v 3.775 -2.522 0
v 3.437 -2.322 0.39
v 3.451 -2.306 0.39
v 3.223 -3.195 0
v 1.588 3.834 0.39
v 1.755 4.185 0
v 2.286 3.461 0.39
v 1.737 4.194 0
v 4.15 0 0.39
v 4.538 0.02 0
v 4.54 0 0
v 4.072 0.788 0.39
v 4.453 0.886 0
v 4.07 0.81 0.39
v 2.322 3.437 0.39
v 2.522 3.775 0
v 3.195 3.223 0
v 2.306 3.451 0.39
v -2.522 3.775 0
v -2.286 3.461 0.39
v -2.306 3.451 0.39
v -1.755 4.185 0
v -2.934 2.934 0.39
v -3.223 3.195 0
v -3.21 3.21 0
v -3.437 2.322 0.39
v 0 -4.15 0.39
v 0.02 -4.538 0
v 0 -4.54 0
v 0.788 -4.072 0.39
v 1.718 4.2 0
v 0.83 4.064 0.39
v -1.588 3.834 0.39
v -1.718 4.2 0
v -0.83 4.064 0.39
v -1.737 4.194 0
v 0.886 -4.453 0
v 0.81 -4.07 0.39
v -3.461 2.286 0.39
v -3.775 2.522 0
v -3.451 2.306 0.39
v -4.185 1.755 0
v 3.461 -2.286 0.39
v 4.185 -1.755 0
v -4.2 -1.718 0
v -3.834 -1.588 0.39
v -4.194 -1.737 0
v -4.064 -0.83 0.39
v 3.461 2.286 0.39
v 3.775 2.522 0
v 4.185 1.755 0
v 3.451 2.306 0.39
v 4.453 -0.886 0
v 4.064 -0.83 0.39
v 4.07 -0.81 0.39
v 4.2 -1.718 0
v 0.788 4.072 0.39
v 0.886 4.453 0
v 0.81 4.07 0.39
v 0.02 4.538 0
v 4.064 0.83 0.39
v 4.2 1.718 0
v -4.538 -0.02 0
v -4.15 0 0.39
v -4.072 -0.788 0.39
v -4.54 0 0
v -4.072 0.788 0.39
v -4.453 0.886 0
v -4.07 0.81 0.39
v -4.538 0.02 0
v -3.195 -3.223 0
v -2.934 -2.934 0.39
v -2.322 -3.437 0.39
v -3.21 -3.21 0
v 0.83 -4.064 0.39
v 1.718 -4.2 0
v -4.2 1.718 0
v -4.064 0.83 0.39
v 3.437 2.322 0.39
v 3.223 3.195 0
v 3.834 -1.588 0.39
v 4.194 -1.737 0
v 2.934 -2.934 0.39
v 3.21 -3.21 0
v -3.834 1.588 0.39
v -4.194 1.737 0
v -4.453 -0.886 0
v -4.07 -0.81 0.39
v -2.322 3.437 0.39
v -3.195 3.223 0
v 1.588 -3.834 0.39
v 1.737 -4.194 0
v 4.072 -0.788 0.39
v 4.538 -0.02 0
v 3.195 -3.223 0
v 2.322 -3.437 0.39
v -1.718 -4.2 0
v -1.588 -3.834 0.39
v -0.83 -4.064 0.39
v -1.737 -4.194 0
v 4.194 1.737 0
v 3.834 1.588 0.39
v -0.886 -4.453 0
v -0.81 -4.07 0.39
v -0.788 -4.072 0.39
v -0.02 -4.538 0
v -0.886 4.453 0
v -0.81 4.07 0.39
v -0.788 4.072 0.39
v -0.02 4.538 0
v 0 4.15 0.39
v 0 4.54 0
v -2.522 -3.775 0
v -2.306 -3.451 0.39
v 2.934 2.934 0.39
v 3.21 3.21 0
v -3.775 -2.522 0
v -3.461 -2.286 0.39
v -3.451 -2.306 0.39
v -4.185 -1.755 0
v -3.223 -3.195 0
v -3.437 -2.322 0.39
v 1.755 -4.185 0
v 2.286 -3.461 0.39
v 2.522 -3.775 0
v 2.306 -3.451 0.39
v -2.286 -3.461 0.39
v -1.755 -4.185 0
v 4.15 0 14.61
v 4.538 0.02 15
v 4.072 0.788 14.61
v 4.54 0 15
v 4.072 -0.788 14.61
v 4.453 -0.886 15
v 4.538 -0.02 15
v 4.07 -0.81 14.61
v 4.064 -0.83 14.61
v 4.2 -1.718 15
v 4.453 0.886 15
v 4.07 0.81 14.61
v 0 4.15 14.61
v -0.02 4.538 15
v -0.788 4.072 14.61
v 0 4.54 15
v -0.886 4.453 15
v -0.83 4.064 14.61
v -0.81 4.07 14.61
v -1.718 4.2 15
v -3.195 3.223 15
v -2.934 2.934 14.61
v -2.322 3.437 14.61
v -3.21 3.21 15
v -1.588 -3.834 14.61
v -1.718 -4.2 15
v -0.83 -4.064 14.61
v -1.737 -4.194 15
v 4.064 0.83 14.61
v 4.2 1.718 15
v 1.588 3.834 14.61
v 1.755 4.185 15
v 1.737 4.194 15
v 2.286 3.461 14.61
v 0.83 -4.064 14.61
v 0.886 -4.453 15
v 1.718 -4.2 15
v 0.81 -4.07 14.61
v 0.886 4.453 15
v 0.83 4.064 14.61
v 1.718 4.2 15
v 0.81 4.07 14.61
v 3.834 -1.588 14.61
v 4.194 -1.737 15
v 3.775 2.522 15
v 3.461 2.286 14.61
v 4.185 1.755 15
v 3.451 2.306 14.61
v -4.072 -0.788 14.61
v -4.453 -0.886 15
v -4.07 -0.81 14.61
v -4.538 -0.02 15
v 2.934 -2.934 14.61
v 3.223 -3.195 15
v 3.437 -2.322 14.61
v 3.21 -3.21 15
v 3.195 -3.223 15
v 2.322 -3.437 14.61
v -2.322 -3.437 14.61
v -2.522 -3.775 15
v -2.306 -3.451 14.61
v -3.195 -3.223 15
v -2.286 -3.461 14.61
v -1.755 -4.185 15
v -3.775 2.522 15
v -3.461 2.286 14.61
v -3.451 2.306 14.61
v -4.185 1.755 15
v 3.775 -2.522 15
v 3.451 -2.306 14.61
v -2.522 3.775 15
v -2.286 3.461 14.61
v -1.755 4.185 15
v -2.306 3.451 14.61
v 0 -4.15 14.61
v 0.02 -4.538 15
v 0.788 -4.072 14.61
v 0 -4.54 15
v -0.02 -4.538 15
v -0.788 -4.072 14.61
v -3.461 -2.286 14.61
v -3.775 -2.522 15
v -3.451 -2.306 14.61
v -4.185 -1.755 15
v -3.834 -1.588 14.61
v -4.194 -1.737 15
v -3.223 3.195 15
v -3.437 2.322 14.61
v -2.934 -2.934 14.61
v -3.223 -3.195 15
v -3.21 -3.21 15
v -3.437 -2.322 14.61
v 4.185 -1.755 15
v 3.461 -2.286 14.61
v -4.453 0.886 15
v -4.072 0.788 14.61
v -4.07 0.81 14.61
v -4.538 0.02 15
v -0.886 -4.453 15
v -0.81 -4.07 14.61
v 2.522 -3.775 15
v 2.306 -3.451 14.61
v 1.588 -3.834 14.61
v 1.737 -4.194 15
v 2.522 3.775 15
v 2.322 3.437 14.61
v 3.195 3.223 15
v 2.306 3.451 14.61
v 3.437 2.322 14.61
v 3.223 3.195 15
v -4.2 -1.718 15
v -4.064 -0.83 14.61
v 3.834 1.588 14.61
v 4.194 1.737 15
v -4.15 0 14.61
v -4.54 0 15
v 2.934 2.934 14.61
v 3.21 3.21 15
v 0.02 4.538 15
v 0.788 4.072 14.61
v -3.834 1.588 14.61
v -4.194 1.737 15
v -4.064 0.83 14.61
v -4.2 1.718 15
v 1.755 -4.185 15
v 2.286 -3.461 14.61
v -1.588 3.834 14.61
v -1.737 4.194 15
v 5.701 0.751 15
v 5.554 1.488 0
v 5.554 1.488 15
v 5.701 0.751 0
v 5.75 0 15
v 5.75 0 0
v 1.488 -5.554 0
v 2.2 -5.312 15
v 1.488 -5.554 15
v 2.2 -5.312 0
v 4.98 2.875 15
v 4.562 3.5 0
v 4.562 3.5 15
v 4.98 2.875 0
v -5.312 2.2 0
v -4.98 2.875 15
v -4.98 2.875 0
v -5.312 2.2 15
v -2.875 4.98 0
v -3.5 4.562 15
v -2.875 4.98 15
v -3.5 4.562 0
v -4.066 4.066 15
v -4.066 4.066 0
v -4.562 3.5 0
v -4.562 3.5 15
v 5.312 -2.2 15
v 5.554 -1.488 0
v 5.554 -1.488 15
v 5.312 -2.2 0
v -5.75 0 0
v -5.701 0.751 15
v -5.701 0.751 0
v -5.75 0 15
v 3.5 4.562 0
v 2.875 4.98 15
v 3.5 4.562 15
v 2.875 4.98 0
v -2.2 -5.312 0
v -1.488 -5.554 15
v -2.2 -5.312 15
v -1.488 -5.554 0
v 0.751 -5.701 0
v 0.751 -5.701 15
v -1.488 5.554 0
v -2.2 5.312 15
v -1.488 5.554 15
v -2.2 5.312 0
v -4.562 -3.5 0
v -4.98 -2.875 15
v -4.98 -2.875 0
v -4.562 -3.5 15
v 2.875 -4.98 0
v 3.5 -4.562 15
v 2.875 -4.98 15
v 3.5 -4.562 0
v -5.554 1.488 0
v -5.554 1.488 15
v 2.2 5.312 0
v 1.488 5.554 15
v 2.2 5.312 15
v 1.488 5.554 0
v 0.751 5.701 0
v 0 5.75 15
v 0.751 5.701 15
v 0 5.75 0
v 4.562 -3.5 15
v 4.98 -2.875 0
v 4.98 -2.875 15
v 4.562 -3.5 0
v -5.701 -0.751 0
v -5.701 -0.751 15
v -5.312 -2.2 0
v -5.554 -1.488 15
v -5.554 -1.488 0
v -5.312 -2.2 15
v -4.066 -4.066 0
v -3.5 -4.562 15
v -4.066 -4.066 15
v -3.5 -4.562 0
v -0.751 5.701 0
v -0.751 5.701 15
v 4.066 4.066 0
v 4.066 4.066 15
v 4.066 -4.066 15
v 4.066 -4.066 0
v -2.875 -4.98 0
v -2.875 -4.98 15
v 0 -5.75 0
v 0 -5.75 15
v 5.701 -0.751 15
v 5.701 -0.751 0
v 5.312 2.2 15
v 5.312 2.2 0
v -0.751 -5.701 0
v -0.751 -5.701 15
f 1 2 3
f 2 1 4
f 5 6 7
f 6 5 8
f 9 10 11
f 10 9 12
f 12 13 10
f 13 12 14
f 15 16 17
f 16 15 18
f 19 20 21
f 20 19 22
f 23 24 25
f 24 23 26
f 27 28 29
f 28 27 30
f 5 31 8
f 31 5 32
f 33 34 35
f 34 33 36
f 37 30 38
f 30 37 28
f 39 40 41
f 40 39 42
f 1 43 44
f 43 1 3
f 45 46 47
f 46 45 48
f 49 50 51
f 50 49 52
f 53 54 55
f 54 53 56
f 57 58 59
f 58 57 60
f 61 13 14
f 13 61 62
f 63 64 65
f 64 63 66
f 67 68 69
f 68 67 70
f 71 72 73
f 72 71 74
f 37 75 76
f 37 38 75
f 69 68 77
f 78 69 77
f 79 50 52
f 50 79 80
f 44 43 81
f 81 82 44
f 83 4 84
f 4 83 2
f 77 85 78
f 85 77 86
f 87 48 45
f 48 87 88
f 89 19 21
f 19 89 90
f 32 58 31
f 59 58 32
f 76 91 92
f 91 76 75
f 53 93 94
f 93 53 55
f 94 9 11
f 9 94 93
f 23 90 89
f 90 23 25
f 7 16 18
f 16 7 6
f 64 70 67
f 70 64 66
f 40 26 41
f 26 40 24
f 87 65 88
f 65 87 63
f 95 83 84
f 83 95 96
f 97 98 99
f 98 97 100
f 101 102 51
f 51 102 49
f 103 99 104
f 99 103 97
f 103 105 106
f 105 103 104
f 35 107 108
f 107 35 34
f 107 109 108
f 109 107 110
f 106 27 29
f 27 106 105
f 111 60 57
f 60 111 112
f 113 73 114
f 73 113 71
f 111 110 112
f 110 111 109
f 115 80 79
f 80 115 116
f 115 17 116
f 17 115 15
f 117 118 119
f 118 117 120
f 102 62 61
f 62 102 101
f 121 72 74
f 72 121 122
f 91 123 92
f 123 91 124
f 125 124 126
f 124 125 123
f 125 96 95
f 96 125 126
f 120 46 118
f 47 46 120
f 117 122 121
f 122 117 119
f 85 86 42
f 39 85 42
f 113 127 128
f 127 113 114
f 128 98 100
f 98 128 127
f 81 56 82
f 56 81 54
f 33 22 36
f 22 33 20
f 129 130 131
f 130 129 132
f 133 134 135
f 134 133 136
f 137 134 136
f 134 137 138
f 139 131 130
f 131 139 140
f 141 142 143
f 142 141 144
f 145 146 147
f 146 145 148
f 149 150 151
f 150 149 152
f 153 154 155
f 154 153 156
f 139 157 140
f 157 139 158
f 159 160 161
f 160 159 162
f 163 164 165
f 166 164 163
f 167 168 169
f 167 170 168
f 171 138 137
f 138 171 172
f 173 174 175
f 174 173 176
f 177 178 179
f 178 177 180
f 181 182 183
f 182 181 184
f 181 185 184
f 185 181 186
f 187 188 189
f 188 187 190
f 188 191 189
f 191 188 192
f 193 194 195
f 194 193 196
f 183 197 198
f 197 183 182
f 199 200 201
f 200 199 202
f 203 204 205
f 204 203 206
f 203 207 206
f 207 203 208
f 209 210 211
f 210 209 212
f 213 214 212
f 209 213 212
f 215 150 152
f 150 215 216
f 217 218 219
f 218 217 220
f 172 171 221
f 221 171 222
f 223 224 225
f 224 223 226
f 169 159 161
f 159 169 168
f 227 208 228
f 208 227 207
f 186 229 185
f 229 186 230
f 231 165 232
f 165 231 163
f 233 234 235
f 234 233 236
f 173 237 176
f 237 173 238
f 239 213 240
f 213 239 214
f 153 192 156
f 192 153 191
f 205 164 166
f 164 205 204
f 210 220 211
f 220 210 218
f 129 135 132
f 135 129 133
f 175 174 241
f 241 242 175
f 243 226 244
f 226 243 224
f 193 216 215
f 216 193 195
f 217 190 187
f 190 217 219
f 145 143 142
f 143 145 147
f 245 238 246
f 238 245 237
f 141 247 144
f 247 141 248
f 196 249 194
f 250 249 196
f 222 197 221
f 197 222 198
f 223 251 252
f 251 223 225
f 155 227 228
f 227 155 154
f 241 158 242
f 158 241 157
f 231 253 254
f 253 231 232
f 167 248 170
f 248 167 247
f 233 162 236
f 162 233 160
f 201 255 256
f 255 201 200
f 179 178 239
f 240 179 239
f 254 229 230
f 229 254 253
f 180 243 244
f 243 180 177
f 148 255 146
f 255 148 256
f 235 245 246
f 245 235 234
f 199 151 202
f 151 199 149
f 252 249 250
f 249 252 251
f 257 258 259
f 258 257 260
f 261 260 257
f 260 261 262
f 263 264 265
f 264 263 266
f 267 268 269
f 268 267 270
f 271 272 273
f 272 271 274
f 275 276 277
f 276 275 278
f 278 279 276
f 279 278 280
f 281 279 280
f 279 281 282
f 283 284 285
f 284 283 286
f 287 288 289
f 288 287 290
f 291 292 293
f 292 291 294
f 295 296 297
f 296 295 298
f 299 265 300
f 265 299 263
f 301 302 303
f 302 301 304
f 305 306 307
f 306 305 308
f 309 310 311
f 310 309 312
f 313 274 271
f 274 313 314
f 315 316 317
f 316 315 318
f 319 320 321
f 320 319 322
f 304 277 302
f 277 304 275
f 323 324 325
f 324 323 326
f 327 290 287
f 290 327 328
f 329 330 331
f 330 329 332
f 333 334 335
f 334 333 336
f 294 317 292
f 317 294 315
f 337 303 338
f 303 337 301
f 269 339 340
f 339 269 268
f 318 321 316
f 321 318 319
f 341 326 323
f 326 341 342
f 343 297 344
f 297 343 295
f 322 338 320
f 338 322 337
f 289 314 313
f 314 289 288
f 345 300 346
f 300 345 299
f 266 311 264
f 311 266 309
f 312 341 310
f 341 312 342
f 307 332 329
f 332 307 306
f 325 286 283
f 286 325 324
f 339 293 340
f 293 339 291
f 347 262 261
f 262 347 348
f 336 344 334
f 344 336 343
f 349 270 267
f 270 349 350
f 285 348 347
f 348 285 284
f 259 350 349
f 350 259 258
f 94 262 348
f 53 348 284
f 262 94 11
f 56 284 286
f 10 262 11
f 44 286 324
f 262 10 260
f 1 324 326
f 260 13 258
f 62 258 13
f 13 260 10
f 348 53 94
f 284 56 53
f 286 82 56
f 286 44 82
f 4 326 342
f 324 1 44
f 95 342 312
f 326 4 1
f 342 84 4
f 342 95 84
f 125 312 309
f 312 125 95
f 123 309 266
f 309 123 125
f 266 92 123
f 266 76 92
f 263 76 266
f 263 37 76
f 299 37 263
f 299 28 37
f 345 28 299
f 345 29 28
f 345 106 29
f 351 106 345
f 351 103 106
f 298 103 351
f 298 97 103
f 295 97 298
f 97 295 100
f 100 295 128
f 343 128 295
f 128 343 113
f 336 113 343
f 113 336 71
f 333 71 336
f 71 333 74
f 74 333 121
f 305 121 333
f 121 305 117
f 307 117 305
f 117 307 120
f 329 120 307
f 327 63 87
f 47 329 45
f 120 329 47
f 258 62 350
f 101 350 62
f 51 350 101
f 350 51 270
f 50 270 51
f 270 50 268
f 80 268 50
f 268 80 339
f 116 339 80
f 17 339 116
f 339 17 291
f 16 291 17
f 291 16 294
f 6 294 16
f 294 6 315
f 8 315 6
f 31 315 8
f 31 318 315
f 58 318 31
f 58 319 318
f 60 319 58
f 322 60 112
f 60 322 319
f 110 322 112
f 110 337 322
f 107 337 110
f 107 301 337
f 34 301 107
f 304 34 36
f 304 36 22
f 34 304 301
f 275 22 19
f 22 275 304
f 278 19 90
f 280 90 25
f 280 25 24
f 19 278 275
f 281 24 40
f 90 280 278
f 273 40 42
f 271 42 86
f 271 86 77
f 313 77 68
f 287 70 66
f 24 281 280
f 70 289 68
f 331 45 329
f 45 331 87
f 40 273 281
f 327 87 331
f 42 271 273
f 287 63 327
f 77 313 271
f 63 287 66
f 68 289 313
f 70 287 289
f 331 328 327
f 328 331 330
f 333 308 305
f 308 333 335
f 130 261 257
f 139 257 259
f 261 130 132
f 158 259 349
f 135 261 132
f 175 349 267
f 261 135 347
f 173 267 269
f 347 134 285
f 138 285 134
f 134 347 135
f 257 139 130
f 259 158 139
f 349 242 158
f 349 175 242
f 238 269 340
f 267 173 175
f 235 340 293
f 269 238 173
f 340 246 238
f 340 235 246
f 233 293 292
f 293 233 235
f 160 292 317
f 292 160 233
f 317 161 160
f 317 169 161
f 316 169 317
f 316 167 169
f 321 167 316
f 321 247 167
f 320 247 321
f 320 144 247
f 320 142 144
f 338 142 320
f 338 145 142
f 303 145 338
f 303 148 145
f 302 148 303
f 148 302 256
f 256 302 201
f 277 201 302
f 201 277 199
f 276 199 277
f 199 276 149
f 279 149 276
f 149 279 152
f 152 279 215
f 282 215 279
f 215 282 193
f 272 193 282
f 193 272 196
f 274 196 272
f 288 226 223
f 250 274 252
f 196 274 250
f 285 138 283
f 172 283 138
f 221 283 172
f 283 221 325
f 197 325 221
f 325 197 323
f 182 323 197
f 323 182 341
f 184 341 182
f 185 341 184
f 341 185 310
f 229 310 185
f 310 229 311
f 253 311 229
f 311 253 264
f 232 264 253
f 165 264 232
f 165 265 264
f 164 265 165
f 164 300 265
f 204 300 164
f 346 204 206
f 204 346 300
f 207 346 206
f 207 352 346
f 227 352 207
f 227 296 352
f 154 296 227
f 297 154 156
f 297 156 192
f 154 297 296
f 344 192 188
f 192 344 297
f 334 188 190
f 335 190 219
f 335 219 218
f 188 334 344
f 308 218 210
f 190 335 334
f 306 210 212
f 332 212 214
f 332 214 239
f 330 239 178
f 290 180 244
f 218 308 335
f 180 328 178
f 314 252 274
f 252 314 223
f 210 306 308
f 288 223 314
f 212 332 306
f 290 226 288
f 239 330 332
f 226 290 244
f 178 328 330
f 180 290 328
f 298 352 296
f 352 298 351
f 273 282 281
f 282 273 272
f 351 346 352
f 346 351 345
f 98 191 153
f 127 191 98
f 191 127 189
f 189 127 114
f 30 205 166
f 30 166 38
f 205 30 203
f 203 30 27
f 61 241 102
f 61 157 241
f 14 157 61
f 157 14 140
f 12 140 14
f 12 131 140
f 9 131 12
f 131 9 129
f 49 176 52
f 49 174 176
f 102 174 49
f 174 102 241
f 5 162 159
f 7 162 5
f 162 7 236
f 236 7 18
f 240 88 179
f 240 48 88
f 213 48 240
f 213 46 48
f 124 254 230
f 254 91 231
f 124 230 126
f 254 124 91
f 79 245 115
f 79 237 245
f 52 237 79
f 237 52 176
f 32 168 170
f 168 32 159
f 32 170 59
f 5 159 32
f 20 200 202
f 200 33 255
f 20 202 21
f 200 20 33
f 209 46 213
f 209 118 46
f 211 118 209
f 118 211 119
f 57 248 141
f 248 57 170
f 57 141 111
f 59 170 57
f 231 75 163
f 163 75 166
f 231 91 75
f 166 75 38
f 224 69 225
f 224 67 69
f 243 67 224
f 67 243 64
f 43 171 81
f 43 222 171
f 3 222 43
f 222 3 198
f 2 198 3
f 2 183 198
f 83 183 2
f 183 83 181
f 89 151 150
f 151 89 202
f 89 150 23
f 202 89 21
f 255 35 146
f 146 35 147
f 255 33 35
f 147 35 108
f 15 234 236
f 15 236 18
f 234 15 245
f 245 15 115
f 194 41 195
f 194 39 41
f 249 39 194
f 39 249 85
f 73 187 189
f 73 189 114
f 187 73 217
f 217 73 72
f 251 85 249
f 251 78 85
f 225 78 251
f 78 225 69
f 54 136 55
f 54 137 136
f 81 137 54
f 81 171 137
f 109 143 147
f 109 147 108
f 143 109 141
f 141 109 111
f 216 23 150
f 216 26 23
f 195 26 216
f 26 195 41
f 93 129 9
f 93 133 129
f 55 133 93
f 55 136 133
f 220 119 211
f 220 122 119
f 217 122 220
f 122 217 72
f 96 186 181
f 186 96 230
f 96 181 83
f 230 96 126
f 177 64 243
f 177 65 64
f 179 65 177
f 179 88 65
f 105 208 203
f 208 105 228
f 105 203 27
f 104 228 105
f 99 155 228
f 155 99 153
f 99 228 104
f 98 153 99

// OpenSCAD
// file: ../lib/gears.scad
// =====================================================================
//  laser-gimbal :: involute spur / herringbone gears (no external libs)
//  use <../lib/gears.scad>
//
//  gear2d(m, z)                         2D involute profile, centred, tooth 0 on +X
//  herringbone(m, z, w, helix)          3D gear z = 0..w. Mating gears use OPPOSITE helix sign.
//  mesh_phase(z_wheel, z_pinion, ang)   rotation (deg) to apply to a pinion placed at polar angle
//                                       `ang` around a wheel (wheel at rotation 0) so teeth interleave.
// =====================================================================

// involute function, a in degrees -> radians
function _inv(a) = tan(a) - a * PI / 180;

// half tooth angle (degrees) at radius r
function _half_ang(r, rb, halfp_rad, pa) =
    (halfp_rad + _inv(pa) - (r <= rb ? 0 : _inv(acos(rb / r)))) * 180 / PI;

module gear2d(m, z, pa = 20, backlash = 0.15, steps = 10) {
    rp = m * z / 2;
    rb = rp * cos(pa);
    ra = rp + m;
    rf = rp - 1.25 * m;
    halfp = (PI * m / 2 - backlash / 2) / (2 * rp);      // half tooth thickness angle at pitch (rad)
    r0 = max(rb, rf);
    rs = [for (i = [0 : steps]) r0 + (ra - r0) * i / steps];
    a0 = _half_ang(r0, rb, halfp, pa);
    root_pts = rf < rb ? [[rf * cos(-a0), rf * sin(-a0)]] : [];
    root_pts2 = rf < rb ? [[rf * cos(a0), rf * sin(a0)]] : [];
    tooth = concat(
        [[(rf - 0.5) * cos(-a0), (rf - 0.5) * sin(-a0)]],
        root_pts,
        [for (r = rs) let(a = _half_ang(r, rb, halfp, pa)) [r * cos(-a), r * sin(-a)]],
        [for (j = [steps : -1 : 0]) let(r = rs[j], a = _half_ang(r, rb, halfp, pa)) [r * cos(a), r * sin(a)]],
        root_pts2,
        [[(rf - 0.5) * cos(a0), (rf - 0.5) * sin(a0)]]
    );
    union() {
        circle(r = rf, $fn = max(z * 4, 64));
        for (i = [0 : z - 1]) rotate(i * 360 / z) polygon(tooth);
    }
}

// twist (deg) over height h for helix angle at pitch radius
function _twist(m, z, h, helix) = h * tan(helix) / (m * z / 2) * 180 / PI;

module herringbone(m, z, w, helix = 20, pa = 20, backlash = 0.15) {
    tw = _twist(m, z, w / 2, helix);
    slices = max(4, ceil(w / 0.8));
    linear_extrude(height = w / 2 + 0.001, twist = tw, slices = slices, convexity = 10)
        gear2d(m, z, pa, backlash);
    translate([0, 0, w / 2])
        rotate([0, 0, -tw])
            linear_extrude(height = w / 2, twist = -tw, slices = slices, convexity = 10)
                gear2d(m, z, pa, backlash);
}

// Pinion phase so its teeth interleave with a wheel whose tooth 0 is on +X.
// Pinion centre sits at polar angle `ang` from the wheel centre.
function mesh_phase(z_wheel, z_pinion, ang) =
    // a wheel gap faces the pinion if the wheel is at 0 and ang is a tooth-centre angle;
    // rotate the pinion so a pinion tooth points back at the wheel centre (into that gap)
    // Nearest wheel tooth sits delta behind the line of centres == wheel rotated by -delta from the
    // aligned case; meshing turns the pinion the opposite way by delta * z_wheel / z_pinion.
    let(
        delta = ang - round(ang / (360 / z_wheel)) * (360 / z_wheel),
        aligned = 180 + ang - 180 / z_pinion   // pinion GAP points back at a wheel tooth on the centre line
    )
    aligned + delta * z_wheel / z_pinion;
// main file
// =====================================================================
//  laser-gimbal :: tilt axle spacer (print 2)
//  Tube on the M8 axle between the payload side ring (|y| 31) and the 608
//  inner race (|y| 46). Passes the arm's 14 mm lip hole and, on +Y, the
//  tilt wheel's 13 mm centre hole. The M8 bolt clamps
//  inner race | spacer | payload | spacer | inner race  into one rigid stack
//  (M8x120: head and nylock bear on axle_collar rings on the 608 inner races, params tilt_axle).
//  world: tilt_spacer() is the +Y one (y 31..46); assembly mirrors it for -Y.
//  Print: standing on an end.
// =====================================================================
include <../lib/params.scad>
use <../lib/gears.scad>

ts_len = tilt_brg_y[0] - payload_wheel_standoff[1];   // 15

module tilt_spacer_local() {
    difference() {
        cylinder(h = ts_len, d = payload_pivot_boss_d, $fn = 48);
        translate([0, 0, -1]) cylinder(h = ts_len + 2, d = m8_clear, $fn = 32);
        for (z = [0, ts_len]) translate([0, 0, z]) mirror([0, 0, z > 0 ? 1 : 0])
            translate([0, 0, -0.01]) cylinder(h = 0.41, d1 = m8_clear + 0.8, d2 = m8_clear - 0.02, $fn = 32);
    }
}

module tilt_spacer() {
    translate([0, payload_wheel_standoff[1], tilt_z]) rotate([-90, 0, 0]) tilt_spacer_local();
}

module tilt_spacer_print() { tilt_spacer_local(); }

tilt_spacer_print();
